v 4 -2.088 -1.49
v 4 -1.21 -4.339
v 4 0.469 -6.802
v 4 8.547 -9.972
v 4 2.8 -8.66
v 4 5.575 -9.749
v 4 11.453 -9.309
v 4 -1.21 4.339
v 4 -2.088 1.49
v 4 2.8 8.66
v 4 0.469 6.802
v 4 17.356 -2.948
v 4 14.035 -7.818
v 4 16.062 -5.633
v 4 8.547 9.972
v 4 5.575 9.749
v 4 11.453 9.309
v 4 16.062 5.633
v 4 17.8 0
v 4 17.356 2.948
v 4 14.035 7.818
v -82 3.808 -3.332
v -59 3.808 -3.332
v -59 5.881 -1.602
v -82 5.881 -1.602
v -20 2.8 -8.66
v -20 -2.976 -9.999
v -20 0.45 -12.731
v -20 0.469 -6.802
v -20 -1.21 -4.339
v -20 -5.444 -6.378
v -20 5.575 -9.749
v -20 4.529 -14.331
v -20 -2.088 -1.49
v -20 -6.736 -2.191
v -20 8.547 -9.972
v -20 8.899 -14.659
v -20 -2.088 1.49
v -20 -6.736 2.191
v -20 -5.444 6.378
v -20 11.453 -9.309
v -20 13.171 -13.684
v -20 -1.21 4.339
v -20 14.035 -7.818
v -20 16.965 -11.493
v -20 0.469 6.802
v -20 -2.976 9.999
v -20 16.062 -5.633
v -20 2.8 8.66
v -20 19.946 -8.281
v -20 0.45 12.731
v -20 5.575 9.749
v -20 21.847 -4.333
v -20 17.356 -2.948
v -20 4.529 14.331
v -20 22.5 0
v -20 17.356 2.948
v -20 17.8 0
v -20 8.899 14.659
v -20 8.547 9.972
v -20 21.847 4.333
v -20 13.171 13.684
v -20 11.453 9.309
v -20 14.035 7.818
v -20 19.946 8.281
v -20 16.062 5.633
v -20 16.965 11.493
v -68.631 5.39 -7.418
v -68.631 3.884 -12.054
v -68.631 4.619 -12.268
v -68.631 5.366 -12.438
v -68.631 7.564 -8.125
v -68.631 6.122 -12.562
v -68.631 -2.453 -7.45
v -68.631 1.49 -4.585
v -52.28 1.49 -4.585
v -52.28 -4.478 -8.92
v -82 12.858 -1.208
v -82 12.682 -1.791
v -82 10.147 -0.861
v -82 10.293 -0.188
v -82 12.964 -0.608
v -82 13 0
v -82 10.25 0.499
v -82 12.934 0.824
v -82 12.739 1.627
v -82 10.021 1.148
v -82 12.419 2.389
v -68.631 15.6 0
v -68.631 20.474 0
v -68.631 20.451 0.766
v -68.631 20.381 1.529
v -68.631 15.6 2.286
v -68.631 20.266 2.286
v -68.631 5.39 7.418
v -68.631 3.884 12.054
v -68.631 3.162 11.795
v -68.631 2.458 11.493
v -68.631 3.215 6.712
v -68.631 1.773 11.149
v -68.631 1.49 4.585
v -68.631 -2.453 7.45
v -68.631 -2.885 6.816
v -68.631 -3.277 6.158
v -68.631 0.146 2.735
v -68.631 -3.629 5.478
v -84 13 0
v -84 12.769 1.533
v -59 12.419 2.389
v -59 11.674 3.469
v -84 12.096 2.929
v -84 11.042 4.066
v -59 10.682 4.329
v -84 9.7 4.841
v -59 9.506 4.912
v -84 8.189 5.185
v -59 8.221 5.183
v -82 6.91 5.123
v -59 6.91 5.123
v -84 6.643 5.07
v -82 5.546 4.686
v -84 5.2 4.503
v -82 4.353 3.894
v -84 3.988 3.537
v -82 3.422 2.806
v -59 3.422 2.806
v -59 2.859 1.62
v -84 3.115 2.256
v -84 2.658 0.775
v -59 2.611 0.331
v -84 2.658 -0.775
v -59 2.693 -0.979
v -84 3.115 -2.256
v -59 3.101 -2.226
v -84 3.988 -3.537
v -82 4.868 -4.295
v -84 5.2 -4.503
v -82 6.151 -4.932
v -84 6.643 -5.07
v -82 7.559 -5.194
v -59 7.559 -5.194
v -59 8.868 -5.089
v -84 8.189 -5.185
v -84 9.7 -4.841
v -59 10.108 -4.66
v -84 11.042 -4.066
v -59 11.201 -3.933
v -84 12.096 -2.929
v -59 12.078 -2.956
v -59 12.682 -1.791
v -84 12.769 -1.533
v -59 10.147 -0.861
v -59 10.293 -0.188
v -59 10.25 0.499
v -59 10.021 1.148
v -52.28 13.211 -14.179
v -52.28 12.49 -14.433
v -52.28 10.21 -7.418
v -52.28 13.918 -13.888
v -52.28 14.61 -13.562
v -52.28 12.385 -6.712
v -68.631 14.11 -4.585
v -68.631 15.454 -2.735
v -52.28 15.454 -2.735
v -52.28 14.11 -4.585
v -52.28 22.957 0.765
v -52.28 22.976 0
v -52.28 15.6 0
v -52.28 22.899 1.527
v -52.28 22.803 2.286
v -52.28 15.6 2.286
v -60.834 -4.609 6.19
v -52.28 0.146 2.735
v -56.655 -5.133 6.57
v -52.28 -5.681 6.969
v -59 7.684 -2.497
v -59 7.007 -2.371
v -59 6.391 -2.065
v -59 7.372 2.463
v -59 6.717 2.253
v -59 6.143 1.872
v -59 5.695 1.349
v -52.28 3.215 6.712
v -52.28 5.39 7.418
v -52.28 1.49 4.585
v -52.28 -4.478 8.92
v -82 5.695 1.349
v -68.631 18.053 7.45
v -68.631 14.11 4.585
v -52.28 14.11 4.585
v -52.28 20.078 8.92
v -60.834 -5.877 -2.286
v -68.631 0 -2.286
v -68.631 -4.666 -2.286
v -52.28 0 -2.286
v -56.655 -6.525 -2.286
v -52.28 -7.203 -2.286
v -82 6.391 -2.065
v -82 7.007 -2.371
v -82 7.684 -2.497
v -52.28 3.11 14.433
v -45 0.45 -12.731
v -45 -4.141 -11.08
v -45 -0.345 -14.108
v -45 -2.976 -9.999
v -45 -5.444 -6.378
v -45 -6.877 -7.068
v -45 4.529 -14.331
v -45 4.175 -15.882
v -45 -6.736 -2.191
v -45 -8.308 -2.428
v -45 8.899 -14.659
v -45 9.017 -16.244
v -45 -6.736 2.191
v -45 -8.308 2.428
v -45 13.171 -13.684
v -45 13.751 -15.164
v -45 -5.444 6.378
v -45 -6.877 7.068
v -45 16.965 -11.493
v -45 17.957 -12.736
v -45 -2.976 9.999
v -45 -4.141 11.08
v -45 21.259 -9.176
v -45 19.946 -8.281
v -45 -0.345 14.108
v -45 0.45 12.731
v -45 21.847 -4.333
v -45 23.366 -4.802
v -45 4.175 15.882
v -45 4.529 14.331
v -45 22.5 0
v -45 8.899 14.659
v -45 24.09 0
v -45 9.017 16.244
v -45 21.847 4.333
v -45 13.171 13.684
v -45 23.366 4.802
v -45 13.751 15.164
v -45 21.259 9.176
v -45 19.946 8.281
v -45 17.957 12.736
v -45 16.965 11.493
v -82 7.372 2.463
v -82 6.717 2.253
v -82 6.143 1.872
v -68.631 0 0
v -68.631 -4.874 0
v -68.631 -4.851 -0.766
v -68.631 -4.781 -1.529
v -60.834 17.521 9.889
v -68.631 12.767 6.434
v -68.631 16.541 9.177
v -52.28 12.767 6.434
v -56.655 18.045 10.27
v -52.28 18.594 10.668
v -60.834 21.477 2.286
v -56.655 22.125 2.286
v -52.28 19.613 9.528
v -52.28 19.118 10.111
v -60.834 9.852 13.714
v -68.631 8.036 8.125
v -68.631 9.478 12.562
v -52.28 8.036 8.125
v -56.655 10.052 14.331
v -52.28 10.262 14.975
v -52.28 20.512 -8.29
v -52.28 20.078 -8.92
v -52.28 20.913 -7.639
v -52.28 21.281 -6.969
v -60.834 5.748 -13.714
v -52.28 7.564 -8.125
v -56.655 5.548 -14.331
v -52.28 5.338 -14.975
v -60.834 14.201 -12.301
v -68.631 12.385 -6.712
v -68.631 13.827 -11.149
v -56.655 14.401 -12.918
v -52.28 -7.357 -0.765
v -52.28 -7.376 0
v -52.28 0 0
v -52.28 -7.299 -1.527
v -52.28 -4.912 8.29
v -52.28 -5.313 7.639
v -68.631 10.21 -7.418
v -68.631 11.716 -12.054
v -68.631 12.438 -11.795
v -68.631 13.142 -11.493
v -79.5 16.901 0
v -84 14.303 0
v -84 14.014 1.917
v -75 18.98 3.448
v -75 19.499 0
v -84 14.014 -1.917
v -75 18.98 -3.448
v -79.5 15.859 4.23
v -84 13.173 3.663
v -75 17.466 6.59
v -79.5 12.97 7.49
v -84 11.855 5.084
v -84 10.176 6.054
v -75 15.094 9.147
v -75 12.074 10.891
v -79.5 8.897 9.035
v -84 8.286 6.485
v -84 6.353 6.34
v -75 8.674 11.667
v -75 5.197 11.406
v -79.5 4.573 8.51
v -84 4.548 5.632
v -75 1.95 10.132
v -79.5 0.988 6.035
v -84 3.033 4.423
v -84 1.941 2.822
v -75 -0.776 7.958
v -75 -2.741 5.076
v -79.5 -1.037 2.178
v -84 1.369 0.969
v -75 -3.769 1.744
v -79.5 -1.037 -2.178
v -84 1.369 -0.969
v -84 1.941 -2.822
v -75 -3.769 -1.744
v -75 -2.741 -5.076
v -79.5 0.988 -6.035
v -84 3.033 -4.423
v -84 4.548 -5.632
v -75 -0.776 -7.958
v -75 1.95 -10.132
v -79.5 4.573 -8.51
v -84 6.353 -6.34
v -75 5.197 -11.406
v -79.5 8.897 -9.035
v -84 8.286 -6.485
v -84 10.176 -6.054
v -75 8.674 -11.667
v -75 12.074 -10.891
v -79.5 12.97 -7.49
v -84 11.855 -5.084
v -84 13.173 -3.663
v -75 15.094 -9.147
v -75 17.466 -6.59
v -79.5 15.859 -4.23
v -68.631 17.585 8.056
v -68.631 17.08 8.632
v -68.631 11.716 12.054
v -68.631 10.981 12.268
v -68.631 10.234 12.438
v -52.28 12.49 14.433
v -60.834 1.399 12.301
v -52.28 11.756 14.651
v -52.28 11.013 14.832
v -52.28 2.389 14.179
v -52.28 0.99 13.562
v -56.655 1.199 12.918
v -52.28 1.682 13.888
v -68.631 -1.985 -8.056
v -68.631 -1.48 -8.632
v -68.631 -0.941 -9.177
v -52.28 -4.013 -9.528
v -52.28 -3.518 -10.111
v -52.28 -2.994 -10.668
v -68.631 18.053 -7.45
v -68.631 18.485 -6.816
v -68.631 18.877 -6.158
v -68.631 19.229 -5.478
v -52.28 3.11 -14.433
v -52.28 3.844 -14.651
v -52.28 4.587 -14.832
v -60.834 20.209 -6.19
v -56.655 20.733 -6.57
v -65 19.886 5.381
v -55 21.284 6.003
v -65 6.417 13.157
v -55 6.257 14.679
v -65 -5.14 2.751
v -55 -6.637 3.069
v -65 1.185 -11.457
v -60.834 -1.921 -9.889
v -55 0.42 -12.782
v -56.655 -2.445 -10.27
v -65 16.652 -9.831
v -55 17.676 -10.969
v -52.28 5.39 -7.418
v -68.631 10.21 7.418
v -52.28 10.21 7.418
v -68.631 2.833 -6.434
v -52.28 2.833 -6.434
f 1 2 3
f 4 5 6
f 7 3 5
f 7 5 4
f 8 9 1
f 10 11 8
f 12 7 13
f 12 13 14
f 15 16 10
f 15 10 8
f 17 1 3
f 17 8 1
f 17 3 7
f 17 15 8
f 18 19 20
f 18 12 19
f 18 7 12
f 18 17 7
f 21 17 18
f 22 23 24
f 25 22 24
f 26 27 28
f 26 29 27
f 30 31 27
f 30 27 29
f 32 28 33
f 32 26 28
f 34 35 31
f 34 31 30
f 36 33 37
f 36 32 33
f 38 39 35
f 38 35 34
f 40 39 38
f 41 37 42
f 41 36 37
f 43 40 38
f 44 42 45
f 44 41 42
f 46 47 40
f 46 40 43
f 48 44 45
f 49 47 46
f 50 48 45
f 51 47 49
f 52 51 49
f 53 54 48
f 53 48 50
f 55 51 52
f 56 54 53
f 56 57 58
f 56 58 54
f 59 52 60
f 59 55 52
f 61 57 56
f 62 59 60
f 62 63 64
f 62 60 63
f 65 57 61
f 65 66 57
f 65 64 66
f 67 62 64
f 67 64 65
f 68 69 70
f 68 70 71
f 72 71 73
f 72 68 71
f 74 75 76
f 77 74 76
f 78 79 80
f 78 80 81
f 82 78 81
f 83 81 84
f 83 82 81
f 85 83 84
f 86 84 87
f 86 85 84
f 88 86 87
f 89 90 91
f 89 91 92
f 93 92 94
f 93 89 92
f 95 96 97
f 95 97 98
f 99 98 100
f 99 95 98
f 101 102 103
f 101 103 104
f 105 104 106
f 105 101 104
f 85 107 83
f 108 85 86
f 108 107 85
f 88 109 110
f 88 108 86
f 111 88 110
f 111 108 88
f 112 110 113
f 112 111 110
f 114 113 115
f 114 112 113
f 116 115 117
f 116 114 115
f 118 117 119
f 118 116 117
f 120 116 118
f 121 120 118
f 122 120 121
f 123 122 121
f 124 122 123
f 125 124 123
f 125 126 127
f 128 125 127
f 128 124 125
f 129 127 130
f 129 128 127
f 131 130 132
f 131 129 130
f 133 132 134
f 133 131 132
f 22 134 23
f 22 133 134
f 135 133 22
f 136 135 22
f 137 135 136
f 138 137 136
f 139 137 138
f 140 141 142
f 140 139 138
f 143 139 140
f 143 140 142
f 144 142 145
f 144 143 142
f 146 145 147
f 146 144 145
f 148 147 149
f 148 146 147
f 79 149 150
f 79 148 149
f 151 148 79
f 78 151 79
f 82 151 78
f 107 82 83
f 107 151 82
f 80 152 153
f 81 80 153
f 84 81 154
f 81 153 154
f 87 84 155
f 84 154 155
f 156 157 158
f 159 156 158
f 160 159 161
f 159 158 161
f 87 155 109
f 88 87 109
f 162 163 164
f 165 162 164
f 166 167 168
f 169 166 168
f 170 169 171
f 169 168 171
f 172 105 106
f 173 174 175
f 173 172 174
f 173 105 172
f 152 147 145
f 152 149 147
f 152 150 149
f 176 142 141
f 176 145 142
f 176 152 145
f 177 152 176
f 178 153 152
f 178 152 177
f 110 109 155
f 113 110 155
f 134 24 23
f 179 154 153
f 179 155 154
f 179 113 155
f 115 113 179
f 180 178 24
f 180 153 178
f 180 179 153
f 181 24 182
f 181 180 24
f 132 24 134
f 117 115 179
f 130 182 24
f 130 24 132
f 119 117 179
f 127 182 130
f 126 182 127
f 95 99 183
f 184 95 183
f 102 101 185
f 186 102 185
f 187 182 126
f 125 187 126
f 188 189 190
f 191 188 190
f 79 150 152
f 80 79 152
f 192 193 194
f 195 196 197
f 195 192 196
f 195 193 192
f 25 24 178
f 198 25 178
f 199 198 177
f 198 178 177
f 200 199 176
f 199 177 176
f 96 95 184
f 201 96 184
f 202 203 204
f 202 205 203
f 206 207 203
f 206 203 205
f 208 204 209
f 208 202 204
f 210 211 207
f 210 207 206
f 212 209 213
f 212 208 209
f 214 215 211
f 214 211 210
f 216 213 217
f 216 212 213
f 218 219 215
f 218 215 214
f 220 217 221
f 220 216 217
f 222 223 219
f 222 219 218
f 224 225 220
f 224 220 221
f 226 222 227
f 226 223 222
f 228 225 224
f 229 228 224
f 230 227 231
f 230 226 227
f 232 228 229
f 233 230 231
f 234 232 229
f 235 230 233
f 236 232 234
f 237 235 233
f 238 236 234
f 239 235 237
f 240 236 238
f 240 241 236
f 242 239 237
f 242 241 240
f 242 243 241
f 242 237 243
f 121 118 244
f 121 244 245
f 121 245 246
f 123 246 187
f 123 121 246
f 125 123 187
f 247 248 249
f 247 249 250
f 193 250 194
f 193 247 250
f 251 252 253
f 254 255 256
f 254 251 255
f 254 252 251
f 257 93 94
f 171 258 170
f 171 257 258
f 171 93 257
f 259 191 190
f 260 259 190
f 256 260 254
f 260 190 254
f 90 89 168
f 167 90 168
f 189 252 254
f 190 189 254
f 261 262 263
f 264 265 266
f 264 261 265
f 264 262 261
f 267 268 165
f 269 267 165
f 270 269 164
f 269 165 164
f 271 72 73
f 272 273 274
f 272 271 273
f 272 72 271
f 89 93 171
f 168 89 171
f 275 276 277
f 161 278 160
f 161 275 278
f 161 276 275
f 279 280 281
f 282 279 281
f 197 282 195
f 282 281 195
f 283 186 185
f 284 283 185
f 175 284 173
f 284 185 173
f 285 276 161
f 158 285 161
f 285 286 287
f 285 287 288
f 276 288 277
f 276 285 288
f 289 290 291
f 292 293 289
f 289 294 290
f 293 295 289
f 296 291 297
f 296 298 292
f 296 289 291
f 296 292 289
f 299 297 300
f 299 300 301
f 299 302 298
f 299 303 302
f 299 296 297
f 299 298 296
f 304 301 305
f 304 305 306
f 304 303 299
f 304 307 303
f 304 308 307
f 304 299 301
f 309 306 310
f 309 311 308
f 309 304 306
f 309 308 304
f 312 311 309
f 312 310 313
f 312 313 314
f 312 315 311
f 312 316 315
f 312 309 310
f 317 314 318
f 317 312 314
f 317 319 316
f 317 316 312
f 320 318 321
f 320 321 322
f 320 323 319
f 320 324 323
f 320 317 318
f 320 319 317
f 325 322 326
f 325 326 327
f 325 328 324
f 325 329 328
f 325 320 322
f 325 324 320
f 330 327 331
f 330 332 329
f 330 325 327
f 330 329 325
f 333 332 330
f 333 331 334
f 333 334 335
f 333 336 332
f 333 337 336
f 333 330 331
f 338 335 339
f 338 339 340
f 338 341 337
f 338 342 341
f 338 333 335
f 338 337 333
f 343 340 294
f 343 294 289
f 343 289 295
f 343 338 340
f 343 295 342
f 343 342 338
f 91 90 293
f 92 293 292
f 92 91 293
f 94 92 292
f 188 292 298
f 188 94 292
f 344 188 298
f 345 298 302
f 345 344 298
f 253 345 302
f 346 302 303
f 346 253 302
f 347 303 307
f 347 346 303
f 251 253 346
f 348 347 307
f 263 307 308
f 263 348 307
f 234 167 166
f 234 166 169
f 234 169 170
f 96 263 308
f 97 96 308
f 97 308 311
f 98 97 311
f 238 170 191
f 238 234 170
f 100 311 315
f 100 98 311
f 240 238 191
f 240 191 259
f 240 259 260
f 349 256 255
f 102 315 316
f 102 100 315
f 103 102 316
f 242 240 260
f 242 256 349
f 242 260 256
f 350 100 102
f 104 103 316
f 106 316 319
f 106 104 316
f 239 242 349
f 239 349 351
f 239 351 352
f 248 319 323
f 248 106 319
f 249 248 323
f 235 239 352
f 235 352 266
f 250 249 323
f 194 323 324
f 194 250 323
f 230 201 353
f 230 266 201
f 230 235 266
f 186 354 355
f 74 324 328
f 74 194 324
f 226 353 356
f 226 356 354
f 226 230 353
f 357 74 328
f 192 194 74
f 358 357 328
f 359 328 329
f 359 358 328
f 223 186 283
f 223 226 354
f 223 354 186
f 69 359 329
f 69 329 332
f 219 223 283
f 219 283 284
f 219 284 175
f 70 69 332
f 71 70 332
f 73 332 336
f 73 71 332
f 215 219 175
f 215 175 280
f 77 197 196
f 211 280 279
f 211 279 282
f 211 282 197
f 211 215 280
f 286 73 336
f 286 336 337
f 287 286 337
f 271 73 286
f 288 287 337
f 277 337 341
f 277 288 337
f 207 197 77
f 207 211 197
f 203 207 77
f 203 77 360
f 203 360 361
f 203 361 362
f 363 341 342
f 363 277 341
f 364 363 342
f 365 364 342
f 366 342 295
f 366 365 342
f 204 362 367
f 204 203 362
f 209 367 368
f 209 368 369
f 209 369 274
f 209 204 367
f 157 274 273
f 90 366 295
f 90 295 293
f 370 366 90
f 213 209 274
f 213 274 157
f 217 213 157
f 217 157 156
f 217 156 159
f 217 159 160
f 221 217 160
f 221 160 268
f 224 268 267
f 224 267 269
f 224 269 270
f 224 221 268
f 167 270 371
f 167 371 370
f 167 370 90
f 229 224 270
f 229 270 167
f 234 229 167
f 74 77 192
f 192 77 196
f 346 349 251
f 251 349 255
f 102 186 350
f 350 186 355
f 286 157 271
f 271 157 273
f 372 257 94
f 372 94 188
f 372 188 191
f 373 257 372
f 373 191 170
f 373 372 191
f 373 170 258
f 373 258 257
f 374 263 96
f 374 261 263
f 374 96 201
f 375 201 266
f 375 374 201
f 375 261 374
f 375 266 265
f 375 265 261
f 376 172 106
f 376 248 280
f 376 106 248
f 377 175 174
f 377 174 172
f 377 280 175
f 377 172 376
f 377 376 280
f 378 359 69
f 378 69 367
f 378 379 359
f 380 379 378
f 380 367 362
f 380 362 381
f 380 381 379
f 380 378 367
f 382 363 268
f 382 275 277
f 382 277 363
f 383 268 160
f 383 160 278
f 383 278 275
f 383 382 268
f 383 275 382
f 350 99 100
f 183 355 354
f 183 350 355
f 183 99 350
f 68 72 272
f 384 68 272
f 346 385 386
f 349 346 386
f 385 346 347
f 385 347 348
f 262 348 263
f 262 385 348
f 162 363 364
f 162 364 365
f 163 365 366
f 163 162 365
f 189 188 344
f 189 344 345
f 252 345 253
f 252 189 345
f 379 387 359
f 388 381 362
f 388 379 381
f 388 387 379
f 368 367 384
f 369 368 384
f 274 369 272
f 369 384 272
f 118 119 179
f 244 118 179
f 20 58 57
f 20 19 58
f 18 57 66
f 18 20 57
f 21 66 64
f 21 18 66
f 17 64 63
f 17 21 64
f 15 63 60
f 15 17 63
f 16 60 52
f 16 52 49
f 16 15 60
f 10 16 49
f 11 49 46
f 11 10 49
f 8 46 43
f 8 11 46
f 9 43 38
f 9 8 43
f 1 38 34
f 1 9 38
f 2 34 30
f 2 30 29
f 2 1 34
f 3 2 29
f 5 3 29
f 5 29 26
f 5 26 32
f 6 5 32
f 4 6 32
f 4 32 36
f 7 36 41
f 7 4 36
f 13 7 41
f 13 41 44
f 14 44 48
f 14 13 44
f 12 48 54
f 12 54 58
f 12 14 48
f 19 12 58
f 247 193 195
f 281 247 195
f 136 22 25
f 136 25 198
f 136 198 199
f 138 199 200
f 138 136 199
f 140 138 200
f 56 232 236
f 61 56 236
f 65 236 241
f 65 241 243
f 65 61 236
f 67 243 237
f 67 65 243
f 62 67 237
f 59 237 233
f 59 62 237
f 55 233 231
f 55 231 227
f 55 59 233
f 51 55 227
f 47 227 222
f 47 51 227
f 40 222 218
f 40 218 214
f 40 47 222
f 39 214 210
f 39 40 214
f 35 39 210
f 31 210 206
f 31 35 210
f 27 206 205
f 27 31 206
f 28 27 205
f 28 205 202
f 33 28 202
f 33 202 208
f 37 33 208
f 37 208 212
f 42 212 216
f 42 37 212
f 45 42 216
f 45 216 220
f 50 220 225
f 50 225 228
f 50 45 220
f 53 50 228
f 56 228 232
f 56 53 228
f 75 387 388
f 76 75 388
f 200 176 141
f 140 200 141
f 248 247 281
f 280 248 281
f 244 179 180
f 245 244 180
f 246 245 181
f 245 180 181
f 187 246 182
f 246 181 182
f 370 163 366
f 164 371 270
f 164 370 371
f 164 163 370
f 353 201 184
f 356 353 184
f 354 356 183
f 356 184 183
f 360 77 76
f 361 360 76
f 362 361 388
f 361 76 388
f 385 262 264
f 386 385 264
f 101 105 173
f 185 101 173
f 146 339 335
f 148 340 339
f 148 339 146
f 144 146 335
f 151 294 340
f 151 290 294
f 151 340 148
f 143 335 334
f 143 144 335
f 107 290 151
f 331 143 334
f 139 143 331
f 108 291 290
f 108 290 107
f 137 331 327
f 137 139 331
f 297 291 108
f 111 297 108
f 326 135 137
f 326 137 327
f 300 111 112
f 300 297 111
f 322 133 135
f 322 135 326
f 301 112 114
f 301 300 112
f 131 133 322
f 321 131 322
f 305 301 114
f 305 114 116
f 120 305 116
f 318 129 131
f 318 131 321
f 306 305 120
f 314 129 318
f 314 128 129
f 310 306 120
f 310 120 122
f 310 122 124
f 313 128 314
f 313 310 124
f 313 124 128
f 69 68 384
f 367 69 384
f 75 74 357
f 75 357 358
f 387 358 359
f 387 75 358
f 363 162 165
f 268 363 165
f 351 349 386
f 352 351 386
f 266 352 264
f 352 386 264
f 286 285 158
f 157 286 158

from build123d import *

# Parameters (mm, degrees)
SKETCH2_W           = 16.351115912
SKETCH2_H           = 2.286251171
CUT_EXTRUDE2_DEPTH  = 8
CIRPATTERN1_COUNT   = 10
BOSS_EXTRUDE2_DEPTH = 23
CIRPATTERN2_COUNT   = 3


with BuildPart() as part:
    # Sketch1 → Revolve1 (revolve)
    with BuildSketch(Plane.XY):
        Polygon((-45, 22.5), (-20, 22.5), (-20, 17.8), (4, 17.8), (4, 7.8), (-59, 7.8), (-59, 13), (-84, 13), (-84, 14.303183025), (-75, 19.499335448), (-45, 24.089980537), align=None)
    revolve(axis=Axis((-59, 7.8, 0), (1, 0, 0)))

    # Sketch2 → Cut-Extrude2 (cut)
    with BuildSketch(Plane(origin=(0, 0, 0), x_dir=(1, 0, 0), z_dir=(0, 1, 0))):
        with Locations((-60.455240296, 1.143125585)):
            Rectangle(SKETCH2_W, SKETCH2_H)
    cut_extrude2 = extrude(amount=-CUT_EXTRUDE2_DEPTH, mode=Mode.SUBTRACT)

    # CirPattern1: Cut-Extrude2 ×10 about axis
    cirpattern1_axis = Axis((0, 7.8, 0), (1, 0, 0))
    for i in range(1, CIRPATTERN1_COUNT):
        add(cut_extrude2.rotate(cirpattern1_axis, i * 360 / CIRPATTERN1_COUNT), mode=Mode.SUBTRACT)

    # Sketch3 → Boss-Extrude2 (add)
    with BuildSketch(Plane.ZY.offset(59)):
        with BuildLine():
            ThreePointArc((2.388609227, 12.418933423), (0.326387029, 12.989746767), (-1.791101139, 12.681798512))
            Line((-1.791101139, 12.681798512), (-0.861106317, 10.147018515))
            ThreePointArc((-0.861106317, 10.147018515), (0.156916841, 10.295070561), (1.148369821, 10.020641069))
            Line((1.148369821, 10.020641069), (2.388609227, 12.418933423))
        make_face()
    boss_extrude2 = extrude(amount=BOSS_EXTRUDE2_DEPTH)

    # CirPattern2: Boss-Extrude2 ×3 about axis
    cirpattern2_axis = Axis((0, 7.8, 0), (1, 0, 0))
    for i in range(1, CIRPATTERN2_COUNT):
        add(boss_extrude2.rotate(cirpattern2_axis, i * 360 / CIRPATTERN2_COUNT))


solid = part.part
